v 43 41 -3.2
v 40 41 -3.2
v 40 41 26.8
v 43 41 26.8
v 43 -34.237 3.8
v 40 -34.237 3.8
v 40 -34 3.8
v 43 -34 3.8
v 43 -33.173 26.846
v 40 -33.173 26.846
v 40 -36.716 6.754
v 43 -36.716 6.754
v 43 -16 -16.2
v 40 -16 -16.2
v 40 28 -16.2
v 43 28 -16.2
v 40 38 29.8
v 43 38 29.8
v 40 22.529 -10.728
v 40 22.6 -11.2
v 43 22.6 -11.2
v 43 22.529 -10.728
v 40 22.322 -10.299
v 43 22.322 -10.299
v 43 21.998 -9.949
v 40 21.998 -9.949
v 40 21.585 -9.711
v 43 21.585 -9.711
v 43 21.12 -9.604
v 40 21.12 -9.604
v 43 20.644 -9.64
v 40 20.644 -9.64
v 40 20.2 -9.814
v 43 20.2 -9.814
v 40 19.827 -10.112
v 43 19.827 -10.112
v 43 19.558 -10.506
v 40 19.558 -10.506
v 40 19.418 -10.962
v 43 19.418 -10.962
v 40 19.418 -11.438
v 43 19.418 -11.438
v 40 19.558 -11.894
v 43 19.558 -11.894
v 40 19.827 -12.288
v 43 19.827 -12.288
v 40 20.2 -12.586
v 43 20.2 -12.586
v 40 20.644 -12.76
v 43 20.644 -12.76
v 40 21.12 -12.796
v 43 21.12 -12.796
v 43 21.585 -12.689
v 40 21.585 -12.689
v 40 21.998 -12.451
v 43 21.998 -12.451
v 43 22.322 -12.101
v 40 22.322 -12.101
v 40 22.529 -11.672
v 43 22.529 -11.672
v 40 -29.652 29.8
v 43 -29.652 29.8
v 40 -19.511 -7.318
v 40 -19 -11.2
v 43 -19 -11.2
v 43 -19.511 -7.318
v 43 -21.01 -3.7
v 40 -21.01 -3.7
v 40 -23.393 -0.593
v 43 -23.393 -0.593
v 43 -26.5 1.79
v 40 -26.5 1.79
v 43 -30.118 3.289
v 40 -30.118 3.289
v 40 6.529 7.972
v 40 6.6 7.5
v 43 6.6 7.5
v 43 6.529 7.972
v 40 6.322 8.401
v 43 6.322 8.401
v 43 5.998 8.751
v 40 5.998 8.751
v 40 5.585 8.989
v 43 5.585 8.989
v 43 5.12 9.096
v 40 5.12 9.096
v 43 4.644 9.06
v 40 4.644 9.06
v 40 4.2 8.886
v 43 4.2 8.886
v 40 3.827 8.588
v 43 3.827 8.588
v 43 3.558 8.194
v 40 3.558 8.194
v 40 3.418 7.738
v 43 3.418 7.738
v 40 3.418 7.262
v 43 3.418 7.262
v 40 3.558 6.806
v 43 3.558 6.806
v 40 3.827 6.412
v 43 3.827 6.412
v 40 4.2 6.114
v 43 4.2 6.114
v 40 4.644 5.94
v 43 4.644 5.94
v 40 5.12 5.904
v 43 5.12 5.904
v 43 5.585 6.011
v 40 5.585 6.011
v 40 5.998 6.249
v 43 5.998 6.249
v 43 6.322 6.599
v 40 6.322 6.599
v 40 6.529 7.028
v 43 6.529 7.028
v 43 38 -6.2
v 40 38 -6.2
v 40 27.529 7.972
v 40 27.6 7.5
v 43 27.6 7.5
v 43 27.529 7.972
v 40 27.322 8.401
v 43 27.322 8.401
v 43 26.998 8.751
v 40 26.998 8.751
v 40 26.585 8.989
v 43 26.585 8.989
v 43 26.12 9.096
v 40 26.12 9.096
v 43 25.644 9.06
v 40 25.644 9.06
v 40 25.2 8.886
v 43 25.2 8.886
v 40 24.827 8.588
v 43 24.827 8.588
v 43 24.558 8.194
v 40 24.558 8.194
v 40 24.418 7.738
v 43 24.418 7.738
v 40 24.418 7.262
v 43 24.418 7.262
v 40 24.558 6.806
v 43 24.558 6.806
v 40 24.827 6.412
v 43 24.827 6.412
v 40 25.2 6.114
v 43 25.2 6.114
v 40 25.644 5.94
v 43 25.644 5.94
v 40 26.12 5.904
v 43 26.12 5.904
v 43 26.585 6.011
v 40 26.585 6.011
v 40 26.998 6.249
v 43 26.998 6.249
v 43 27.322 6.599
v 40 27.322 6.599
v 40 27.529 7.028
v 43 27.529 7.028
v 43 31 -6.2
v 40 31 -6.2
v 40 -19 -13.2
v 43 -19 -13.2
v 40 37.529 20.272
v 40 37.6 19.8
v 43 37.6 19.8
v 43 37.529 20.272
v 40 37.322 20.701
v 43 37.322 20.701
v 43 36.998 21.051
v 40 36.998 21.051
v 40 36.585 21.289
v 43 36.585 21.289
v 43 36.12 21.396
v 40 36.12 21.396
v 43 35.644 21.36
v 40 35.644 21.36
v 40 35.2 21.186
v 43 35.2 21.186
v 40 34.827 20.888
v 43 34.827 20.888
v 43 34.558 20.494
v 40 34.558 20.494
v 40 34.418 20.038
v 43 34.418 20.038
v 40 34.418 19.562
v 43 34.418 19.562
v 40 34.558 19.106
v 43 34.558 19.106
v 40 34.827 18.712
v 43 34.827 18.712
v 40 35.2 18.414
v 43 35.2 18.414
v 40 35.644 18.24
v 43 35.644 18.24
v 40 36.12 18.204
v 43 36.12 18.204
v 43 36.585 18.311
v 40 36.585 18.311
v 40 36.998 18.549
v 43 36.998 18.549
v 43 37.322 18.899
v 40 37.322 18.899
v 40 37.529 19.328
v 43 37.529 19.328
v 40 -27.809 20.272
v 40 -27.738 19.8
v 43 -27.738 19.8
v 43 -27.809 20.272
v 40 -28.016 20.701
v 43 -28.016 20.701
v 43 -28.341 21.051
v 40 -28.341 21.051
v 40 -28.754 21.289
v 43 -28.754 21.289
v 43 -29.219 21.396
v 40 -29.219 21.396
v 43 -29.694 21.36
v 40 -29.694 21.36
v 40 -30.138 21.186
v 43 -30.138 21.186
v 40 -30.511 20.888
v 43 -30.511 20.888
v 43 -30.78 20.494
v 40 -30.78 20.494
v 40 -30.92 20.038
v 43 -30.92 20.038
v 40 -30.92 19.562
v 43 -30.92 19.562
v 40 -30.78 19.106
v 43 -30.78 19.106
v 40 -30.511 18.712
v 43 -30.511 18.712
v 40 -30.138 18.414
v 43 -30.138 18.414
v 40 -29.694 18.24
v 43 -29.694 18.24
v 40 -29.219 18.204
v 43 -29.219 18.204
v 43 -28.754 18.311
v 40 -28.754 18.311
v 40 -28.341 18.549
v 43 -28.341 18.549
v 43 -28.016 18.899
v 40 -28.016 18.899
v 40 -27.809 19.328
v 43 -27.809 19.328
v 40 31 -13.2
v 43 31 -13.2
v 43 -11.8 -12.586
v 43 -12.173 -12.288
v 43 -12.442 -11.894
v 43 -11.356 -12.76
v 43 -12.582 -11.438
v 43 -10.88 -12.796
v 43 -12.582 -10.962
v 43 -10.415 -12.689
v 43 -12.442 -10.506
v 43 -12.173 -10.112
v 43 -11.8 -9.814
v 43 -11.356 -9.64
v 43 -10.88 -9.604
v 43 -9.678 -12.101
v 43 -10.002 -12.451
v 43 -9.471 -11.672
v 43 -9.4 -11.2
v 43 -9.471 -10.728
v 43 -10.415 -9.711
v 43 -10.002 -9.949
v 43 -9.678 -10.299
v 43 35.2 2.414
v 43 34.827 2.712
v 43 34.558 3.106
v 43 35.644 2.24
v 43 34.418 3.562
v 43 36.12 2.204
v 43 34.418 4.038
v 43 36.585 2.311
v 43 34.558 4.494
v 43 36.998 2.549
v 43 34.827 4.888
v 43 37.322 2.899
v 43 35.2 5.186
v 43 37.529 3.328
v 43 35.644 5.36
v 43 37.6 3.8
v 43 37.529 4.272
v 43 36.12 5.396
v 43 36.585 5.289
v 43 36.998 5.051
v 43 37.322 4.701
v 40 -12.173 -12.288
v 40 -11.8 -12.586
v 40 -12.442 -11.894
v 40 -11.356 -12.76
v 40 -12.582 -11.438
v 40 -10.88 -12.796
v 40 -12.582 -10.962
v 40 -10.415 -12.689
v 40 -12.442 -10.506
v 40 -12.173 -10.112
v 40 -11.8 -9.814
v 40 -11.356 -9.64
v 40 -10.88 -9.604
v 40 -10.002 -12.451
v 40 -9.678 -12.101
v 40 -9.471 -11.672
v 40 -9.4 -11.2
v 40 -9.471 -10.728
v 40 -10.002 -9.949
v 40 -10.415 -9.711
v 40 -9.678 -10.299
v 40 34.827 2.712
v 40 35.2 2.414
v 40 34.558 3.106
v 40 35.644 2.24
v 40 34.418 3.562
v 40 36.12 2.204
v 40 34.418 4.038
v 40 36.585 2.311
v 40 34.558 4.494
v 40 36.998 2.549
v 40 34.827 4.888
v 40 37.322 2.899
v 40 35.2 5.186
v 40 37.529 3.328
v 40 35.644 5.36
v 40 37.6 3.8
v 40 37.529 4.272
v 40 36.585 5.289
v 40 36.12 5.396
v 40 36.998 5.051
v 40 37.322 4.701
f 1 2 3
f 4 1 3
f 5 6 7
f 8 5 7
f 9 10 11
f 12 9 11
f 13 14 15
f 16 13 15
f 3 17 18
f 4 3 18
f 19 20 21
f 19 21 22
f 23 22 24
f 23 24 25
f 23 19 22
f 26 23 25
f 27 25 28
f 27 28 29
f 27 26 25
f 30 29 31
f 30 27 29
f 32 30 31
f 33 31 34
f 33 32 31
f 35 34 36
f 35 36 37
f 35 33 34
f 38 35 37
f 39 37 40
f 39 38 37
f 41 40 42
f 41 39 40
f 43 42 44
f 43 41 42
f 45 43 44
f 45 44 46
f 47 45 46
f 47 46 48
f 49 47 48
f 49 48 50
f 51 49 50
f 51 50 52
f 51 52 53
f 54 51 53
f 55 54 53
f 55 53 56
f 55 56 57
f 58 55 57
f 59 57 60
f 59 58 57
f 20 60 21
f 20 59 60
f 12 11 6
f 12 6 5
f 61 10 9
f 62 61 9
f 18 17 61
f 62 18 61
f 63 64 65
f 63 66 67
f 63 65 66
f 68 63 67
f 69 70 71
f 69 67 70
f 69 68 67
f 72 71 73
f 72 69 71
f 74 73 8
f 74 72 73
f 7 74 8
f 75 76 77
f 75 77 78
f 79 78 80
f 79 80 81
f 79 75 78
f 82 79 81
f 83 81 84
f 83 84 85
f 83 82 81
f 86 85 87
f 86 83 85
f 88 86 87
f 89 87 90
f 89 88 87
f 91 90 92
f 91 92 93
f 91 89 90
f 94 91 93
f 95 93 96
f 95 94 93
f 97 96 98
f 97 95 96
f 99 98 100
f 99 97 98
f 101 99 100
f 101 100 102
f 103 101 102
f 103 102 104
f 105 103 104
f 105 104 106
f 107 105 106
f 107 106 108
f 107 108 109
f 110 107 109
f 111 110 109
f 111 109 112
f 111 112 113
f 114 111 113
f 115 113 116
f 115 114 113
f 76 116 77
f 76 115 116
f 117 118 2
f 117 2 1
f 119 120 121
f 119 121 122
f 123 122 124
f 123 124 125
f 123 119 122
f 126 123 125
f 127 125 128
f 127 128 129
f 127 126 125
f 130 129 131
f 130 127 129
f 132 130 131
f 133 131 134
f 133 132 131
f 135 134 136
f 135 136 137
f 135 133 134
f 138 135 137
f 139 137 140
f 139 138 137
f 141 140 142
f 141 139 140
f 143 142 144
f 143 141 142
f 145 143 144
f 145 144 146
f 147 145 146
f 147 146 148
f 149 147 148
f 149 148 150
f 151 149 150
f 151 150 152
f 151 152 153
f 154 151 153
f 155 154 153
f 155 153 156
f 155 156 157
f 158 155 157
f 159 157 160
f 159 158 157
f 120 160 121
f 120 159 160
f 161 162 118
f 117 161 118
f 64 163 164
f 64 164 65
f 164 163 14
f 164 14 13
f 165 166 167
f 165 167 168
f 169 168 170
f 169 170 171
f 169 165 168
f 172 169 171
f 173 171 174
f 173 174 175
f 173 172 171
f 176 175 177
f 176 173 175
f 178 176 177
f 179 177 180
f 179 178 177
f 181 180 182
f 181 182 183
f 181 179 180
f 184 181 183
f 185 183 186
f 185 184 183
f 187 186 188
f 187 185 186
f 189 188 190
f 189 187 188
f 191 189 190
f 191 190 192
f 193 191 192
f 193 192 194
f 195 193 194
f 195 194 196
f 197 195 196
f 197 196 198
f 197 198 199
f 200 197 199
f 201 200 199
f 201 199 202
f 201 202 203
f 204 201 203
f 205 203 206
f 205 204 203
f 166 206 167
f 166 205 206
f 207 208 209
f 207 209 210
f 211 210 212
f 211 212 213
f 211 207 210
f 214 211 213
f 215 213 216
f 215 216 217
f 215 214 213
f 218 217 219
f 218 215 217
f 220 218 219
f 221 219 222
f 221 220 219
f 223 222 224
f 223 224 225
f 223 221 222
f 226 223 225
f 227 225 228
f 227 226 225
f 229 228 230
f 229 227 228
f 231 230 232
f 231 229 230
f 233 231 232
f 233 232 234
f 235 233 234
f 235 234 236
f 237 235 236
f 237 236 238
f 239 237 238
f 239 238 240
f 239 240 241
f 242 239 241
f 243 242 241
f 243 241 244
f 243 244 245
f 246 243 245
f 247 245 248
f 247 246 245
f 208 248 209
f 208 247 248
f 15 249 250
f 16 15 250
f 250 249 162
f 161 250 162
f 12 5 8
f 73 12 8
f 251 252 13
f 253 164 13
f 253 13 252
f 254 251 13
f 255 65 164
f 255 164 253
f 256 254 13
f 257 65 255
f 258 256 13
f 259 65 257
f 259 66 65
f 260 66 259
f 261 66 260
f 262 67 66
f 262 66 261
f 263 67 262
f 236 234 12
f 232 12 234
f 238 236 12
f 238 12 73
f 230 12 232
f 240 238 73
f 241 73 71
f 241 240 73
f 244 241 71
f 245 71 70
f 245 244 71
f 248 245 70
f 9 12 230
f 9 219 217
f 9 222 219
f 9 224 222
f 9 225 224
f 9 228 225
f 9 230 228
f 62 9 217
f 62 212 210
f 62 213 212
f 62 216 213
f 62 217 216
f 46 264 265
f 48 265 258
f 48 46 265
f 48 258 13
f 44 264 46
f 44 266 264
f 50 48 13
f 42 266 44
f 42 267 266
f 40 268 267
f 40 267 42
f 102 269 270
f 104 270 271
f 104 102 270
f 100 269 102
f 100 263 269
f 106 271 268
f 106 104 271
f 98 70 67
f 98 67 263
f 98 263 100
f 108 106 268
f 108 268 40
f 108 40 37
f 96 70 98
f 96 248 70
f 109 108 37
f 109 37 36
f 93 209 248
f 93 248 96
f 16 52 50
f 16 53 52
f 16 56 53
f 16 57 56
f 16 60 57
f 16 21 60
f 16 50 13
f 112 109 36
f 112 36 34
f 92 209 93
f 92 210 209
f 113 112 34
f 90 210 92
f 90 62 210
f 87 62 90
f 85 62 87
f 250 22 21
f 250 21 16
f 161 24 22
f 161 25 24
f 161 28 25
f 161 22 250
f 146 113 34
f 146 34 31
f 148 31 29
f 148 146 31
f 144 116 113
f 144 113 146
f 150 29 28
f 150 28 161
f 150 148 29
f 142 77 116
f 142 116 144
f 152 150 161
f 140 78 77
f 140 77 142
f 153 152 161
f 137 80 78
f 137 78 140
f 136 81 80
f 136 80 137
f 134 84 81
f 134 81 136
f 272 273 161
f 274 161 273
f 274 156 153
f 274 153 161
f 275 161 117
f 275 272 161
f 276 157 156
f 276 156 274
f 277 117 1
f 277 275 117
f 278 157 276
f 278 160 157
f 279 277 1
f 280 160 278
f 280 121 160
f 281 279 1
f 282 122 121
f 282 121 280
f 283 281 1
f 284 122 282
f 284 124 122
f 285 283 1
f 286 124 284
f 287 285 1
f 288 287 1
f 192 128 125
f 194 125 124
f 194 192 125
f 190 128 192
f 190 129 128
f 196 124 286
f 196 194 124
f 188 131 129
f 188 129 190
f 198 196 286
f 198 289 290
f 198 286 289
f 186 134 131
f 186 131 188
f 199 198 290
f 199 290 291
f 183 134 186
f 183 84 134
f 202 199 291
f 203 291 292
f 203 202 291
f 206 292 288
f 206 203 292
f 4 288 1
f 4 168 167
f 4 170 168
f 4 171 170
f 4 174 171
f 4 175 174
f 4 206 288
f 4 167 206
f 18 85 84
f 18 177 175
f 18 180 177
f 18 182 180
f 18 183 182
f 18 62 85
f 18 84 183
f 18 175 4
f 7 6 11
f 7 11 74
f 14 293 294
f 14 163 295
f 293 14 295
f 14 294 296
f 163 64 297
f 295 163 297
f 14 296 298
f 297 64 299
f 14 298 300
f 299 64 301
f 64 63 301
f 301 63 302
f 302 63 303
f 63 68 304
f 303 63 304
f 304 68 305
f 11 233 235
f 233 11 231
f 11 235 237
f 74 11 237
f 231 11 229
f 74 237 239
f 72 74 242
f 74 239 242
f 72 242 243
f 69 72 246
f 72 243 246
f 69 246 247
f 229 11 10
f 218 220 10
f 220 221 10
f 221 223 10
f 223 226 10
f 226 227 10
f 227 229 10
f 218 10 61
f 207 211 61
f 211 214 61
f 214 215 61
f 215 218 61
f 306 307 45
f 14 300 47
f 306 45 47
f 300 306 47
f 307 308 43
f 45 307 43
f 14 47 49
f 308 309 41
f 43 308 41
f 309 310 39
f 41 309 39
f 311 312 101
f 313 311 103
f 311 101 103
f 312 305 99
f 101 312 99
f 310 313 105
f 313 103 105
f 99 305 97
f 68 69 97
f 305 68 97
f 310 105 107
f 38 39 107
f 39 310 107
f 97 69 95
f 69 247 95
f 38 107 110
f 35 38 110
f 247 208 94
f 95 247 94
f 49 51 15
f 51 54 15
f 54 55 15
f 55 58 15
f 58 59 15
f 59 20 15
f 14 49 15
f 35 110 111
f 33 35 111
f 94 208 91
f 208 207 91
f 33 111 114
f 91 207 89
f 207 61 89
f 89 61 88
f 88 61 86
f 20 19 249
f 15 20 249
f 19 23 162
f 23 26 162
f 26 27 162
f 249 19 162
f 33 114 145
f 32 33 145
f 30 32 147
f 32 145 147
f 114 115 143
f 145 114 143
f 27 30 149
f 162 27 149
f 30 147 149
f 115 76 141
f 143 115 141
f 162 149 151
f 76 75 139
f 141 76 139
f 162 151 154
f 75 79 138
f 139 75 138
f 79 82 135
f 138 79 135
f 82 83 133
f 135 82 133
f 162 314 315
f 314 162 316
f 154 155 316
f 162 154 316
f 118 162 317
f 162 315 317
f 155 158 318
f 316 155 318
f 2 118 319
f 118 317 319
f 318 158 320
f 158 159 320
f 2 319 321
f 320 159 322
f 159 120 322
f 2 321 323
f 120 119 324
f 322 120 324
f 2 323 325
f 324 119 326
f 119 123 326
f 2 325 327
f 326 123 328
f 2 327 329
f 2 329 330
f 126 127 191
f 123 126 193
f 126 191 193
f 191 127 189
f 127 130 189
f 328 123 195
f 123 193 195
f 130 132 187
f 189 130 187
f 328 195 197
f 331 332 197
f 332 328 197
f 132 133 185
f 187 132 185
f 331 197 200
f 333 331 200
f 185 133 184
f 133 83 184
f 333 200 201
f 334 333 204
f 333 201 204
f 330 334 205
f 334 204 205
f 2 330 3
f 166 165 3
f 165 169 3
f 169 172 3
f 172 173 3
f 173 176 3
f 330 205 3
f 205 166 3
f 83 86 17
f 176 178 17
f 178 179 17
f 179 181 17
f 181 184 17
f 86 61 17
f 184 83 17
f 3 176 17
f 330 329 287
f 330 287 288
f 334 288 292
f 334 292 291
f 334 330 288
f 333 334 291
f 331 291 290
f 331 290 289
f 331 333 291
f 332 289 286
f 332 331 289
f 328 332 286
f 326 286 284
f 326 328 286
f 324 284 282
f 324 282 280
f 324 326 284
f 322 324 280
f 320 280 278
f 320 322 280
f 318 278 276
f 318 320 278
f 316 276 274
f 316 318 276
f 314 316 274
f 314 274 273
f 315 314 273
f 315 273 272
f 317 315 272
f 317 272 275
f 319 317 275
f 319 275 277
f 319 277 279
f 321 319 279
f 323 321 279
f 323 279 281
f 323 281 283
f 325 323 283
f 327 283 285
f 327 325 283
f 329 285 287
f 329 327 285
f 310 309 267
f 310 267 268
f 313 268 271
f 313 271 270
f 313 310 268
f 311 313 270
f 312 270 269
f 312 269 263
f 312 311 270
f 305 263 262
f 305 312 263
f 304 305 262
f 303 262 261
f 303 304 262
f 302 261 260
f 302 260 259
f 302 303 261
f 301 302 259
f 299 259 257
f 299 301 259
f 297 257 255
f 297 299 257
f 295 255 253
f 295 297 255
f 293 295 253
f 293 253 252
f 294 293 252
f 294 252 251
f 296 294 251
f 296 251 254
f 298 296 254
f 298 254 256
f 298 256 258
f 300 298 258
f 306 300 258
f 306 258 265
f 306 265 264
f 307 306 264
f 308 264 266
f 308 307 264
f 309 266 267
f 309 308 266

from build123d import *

# Parameters (mm, degrees)
SKETCH040_R     = 1.6
PAD023_DEPTH    = 3
SKETCH041_W     = 10
SKETCH041_H     = 10
POCKET016_DEPTH = 3.001
CHAMFER005_SIZE = 3


with BuildPart() as part:
    # Sketch040 → Pad023 (new body)
    with BuildSketch(Plane.YZ):
        Polygon((41, -16.2), (41, 29.8), (-32.652229, 29.8), (-39, -6.2), (-39, -16.2), align=None)
        with Locations((36, 19.8)):
            Circle(SKETCH040_R, mode=Mode.SUBTRACT)
        with Locations((-29.338365, 19.8)):
            Circle(SKETCH040_R, mode=Mode.SUBTRACT)
        with Locations((21, -11.2)):
            Circle(SKETCH040_R, mode=Mode.SUBTRACT)
        with Locations((-11, -11.2)):
            Circle(SKETCH040_R, mode=Mode.SUBTRACT)
        with Locations((5, 7.5)):
            Circle(SKETCH040_R, mode=Mode.SUBTRACT)
        with Locations((26, 7.5)):
            Circle(SKETCH040_R, mode=Mode.SUBTRACT)
        with Locations((36, 3.8)):
            Circle(SKETCH040_R, mode=Mode.SUBTRACT)
    extrude(amount=PAD023_DEPTH)

    # Sketch041 → Pocket016 (cut, through all)
    with BuildSketch(Plane.YZ):
        with Locations((36, -11.2)):
            Rectangle(SKETCH041_W, SKETCH041_H)
        with BuildLine():
            Line((-39, -16.2), (-39, 3.8))
            Line((-39, 3.8), (-34, 3.8))
            ThreePointArc((-19, -11.2), (-23.393398, -0.593398), (-34, 3.8))
            Line((-19, -16.2), (-19, -11.2))
            Line((-39, -16.2), (-19, -16.2))
        make_face()
    extrude(amount=POCKET016_DEPTH, mode=Mode.SUBTRACT)

    # Chamfer005
    chamfer005_edges = [part.edges().sort_by_distance(p)[0] for p in [
        (1.5, -32.652229, 29.8),
        (1.5, -37.23673, 3.8),
        (1.5, -19, -16.2),
        (1.5, 41, 29.8),
        (1.5, 41, -6.2),
        (1.5, 31, -16.2),
    ]]
    chamfer(chamfer005_edges, length=CHAMFER005_SIZE)


with BuildPart() as part_1:
    # Body023 placement: moved
    add(part.part.moved(Location((40, 0, 0))))


solid = part_1.part
